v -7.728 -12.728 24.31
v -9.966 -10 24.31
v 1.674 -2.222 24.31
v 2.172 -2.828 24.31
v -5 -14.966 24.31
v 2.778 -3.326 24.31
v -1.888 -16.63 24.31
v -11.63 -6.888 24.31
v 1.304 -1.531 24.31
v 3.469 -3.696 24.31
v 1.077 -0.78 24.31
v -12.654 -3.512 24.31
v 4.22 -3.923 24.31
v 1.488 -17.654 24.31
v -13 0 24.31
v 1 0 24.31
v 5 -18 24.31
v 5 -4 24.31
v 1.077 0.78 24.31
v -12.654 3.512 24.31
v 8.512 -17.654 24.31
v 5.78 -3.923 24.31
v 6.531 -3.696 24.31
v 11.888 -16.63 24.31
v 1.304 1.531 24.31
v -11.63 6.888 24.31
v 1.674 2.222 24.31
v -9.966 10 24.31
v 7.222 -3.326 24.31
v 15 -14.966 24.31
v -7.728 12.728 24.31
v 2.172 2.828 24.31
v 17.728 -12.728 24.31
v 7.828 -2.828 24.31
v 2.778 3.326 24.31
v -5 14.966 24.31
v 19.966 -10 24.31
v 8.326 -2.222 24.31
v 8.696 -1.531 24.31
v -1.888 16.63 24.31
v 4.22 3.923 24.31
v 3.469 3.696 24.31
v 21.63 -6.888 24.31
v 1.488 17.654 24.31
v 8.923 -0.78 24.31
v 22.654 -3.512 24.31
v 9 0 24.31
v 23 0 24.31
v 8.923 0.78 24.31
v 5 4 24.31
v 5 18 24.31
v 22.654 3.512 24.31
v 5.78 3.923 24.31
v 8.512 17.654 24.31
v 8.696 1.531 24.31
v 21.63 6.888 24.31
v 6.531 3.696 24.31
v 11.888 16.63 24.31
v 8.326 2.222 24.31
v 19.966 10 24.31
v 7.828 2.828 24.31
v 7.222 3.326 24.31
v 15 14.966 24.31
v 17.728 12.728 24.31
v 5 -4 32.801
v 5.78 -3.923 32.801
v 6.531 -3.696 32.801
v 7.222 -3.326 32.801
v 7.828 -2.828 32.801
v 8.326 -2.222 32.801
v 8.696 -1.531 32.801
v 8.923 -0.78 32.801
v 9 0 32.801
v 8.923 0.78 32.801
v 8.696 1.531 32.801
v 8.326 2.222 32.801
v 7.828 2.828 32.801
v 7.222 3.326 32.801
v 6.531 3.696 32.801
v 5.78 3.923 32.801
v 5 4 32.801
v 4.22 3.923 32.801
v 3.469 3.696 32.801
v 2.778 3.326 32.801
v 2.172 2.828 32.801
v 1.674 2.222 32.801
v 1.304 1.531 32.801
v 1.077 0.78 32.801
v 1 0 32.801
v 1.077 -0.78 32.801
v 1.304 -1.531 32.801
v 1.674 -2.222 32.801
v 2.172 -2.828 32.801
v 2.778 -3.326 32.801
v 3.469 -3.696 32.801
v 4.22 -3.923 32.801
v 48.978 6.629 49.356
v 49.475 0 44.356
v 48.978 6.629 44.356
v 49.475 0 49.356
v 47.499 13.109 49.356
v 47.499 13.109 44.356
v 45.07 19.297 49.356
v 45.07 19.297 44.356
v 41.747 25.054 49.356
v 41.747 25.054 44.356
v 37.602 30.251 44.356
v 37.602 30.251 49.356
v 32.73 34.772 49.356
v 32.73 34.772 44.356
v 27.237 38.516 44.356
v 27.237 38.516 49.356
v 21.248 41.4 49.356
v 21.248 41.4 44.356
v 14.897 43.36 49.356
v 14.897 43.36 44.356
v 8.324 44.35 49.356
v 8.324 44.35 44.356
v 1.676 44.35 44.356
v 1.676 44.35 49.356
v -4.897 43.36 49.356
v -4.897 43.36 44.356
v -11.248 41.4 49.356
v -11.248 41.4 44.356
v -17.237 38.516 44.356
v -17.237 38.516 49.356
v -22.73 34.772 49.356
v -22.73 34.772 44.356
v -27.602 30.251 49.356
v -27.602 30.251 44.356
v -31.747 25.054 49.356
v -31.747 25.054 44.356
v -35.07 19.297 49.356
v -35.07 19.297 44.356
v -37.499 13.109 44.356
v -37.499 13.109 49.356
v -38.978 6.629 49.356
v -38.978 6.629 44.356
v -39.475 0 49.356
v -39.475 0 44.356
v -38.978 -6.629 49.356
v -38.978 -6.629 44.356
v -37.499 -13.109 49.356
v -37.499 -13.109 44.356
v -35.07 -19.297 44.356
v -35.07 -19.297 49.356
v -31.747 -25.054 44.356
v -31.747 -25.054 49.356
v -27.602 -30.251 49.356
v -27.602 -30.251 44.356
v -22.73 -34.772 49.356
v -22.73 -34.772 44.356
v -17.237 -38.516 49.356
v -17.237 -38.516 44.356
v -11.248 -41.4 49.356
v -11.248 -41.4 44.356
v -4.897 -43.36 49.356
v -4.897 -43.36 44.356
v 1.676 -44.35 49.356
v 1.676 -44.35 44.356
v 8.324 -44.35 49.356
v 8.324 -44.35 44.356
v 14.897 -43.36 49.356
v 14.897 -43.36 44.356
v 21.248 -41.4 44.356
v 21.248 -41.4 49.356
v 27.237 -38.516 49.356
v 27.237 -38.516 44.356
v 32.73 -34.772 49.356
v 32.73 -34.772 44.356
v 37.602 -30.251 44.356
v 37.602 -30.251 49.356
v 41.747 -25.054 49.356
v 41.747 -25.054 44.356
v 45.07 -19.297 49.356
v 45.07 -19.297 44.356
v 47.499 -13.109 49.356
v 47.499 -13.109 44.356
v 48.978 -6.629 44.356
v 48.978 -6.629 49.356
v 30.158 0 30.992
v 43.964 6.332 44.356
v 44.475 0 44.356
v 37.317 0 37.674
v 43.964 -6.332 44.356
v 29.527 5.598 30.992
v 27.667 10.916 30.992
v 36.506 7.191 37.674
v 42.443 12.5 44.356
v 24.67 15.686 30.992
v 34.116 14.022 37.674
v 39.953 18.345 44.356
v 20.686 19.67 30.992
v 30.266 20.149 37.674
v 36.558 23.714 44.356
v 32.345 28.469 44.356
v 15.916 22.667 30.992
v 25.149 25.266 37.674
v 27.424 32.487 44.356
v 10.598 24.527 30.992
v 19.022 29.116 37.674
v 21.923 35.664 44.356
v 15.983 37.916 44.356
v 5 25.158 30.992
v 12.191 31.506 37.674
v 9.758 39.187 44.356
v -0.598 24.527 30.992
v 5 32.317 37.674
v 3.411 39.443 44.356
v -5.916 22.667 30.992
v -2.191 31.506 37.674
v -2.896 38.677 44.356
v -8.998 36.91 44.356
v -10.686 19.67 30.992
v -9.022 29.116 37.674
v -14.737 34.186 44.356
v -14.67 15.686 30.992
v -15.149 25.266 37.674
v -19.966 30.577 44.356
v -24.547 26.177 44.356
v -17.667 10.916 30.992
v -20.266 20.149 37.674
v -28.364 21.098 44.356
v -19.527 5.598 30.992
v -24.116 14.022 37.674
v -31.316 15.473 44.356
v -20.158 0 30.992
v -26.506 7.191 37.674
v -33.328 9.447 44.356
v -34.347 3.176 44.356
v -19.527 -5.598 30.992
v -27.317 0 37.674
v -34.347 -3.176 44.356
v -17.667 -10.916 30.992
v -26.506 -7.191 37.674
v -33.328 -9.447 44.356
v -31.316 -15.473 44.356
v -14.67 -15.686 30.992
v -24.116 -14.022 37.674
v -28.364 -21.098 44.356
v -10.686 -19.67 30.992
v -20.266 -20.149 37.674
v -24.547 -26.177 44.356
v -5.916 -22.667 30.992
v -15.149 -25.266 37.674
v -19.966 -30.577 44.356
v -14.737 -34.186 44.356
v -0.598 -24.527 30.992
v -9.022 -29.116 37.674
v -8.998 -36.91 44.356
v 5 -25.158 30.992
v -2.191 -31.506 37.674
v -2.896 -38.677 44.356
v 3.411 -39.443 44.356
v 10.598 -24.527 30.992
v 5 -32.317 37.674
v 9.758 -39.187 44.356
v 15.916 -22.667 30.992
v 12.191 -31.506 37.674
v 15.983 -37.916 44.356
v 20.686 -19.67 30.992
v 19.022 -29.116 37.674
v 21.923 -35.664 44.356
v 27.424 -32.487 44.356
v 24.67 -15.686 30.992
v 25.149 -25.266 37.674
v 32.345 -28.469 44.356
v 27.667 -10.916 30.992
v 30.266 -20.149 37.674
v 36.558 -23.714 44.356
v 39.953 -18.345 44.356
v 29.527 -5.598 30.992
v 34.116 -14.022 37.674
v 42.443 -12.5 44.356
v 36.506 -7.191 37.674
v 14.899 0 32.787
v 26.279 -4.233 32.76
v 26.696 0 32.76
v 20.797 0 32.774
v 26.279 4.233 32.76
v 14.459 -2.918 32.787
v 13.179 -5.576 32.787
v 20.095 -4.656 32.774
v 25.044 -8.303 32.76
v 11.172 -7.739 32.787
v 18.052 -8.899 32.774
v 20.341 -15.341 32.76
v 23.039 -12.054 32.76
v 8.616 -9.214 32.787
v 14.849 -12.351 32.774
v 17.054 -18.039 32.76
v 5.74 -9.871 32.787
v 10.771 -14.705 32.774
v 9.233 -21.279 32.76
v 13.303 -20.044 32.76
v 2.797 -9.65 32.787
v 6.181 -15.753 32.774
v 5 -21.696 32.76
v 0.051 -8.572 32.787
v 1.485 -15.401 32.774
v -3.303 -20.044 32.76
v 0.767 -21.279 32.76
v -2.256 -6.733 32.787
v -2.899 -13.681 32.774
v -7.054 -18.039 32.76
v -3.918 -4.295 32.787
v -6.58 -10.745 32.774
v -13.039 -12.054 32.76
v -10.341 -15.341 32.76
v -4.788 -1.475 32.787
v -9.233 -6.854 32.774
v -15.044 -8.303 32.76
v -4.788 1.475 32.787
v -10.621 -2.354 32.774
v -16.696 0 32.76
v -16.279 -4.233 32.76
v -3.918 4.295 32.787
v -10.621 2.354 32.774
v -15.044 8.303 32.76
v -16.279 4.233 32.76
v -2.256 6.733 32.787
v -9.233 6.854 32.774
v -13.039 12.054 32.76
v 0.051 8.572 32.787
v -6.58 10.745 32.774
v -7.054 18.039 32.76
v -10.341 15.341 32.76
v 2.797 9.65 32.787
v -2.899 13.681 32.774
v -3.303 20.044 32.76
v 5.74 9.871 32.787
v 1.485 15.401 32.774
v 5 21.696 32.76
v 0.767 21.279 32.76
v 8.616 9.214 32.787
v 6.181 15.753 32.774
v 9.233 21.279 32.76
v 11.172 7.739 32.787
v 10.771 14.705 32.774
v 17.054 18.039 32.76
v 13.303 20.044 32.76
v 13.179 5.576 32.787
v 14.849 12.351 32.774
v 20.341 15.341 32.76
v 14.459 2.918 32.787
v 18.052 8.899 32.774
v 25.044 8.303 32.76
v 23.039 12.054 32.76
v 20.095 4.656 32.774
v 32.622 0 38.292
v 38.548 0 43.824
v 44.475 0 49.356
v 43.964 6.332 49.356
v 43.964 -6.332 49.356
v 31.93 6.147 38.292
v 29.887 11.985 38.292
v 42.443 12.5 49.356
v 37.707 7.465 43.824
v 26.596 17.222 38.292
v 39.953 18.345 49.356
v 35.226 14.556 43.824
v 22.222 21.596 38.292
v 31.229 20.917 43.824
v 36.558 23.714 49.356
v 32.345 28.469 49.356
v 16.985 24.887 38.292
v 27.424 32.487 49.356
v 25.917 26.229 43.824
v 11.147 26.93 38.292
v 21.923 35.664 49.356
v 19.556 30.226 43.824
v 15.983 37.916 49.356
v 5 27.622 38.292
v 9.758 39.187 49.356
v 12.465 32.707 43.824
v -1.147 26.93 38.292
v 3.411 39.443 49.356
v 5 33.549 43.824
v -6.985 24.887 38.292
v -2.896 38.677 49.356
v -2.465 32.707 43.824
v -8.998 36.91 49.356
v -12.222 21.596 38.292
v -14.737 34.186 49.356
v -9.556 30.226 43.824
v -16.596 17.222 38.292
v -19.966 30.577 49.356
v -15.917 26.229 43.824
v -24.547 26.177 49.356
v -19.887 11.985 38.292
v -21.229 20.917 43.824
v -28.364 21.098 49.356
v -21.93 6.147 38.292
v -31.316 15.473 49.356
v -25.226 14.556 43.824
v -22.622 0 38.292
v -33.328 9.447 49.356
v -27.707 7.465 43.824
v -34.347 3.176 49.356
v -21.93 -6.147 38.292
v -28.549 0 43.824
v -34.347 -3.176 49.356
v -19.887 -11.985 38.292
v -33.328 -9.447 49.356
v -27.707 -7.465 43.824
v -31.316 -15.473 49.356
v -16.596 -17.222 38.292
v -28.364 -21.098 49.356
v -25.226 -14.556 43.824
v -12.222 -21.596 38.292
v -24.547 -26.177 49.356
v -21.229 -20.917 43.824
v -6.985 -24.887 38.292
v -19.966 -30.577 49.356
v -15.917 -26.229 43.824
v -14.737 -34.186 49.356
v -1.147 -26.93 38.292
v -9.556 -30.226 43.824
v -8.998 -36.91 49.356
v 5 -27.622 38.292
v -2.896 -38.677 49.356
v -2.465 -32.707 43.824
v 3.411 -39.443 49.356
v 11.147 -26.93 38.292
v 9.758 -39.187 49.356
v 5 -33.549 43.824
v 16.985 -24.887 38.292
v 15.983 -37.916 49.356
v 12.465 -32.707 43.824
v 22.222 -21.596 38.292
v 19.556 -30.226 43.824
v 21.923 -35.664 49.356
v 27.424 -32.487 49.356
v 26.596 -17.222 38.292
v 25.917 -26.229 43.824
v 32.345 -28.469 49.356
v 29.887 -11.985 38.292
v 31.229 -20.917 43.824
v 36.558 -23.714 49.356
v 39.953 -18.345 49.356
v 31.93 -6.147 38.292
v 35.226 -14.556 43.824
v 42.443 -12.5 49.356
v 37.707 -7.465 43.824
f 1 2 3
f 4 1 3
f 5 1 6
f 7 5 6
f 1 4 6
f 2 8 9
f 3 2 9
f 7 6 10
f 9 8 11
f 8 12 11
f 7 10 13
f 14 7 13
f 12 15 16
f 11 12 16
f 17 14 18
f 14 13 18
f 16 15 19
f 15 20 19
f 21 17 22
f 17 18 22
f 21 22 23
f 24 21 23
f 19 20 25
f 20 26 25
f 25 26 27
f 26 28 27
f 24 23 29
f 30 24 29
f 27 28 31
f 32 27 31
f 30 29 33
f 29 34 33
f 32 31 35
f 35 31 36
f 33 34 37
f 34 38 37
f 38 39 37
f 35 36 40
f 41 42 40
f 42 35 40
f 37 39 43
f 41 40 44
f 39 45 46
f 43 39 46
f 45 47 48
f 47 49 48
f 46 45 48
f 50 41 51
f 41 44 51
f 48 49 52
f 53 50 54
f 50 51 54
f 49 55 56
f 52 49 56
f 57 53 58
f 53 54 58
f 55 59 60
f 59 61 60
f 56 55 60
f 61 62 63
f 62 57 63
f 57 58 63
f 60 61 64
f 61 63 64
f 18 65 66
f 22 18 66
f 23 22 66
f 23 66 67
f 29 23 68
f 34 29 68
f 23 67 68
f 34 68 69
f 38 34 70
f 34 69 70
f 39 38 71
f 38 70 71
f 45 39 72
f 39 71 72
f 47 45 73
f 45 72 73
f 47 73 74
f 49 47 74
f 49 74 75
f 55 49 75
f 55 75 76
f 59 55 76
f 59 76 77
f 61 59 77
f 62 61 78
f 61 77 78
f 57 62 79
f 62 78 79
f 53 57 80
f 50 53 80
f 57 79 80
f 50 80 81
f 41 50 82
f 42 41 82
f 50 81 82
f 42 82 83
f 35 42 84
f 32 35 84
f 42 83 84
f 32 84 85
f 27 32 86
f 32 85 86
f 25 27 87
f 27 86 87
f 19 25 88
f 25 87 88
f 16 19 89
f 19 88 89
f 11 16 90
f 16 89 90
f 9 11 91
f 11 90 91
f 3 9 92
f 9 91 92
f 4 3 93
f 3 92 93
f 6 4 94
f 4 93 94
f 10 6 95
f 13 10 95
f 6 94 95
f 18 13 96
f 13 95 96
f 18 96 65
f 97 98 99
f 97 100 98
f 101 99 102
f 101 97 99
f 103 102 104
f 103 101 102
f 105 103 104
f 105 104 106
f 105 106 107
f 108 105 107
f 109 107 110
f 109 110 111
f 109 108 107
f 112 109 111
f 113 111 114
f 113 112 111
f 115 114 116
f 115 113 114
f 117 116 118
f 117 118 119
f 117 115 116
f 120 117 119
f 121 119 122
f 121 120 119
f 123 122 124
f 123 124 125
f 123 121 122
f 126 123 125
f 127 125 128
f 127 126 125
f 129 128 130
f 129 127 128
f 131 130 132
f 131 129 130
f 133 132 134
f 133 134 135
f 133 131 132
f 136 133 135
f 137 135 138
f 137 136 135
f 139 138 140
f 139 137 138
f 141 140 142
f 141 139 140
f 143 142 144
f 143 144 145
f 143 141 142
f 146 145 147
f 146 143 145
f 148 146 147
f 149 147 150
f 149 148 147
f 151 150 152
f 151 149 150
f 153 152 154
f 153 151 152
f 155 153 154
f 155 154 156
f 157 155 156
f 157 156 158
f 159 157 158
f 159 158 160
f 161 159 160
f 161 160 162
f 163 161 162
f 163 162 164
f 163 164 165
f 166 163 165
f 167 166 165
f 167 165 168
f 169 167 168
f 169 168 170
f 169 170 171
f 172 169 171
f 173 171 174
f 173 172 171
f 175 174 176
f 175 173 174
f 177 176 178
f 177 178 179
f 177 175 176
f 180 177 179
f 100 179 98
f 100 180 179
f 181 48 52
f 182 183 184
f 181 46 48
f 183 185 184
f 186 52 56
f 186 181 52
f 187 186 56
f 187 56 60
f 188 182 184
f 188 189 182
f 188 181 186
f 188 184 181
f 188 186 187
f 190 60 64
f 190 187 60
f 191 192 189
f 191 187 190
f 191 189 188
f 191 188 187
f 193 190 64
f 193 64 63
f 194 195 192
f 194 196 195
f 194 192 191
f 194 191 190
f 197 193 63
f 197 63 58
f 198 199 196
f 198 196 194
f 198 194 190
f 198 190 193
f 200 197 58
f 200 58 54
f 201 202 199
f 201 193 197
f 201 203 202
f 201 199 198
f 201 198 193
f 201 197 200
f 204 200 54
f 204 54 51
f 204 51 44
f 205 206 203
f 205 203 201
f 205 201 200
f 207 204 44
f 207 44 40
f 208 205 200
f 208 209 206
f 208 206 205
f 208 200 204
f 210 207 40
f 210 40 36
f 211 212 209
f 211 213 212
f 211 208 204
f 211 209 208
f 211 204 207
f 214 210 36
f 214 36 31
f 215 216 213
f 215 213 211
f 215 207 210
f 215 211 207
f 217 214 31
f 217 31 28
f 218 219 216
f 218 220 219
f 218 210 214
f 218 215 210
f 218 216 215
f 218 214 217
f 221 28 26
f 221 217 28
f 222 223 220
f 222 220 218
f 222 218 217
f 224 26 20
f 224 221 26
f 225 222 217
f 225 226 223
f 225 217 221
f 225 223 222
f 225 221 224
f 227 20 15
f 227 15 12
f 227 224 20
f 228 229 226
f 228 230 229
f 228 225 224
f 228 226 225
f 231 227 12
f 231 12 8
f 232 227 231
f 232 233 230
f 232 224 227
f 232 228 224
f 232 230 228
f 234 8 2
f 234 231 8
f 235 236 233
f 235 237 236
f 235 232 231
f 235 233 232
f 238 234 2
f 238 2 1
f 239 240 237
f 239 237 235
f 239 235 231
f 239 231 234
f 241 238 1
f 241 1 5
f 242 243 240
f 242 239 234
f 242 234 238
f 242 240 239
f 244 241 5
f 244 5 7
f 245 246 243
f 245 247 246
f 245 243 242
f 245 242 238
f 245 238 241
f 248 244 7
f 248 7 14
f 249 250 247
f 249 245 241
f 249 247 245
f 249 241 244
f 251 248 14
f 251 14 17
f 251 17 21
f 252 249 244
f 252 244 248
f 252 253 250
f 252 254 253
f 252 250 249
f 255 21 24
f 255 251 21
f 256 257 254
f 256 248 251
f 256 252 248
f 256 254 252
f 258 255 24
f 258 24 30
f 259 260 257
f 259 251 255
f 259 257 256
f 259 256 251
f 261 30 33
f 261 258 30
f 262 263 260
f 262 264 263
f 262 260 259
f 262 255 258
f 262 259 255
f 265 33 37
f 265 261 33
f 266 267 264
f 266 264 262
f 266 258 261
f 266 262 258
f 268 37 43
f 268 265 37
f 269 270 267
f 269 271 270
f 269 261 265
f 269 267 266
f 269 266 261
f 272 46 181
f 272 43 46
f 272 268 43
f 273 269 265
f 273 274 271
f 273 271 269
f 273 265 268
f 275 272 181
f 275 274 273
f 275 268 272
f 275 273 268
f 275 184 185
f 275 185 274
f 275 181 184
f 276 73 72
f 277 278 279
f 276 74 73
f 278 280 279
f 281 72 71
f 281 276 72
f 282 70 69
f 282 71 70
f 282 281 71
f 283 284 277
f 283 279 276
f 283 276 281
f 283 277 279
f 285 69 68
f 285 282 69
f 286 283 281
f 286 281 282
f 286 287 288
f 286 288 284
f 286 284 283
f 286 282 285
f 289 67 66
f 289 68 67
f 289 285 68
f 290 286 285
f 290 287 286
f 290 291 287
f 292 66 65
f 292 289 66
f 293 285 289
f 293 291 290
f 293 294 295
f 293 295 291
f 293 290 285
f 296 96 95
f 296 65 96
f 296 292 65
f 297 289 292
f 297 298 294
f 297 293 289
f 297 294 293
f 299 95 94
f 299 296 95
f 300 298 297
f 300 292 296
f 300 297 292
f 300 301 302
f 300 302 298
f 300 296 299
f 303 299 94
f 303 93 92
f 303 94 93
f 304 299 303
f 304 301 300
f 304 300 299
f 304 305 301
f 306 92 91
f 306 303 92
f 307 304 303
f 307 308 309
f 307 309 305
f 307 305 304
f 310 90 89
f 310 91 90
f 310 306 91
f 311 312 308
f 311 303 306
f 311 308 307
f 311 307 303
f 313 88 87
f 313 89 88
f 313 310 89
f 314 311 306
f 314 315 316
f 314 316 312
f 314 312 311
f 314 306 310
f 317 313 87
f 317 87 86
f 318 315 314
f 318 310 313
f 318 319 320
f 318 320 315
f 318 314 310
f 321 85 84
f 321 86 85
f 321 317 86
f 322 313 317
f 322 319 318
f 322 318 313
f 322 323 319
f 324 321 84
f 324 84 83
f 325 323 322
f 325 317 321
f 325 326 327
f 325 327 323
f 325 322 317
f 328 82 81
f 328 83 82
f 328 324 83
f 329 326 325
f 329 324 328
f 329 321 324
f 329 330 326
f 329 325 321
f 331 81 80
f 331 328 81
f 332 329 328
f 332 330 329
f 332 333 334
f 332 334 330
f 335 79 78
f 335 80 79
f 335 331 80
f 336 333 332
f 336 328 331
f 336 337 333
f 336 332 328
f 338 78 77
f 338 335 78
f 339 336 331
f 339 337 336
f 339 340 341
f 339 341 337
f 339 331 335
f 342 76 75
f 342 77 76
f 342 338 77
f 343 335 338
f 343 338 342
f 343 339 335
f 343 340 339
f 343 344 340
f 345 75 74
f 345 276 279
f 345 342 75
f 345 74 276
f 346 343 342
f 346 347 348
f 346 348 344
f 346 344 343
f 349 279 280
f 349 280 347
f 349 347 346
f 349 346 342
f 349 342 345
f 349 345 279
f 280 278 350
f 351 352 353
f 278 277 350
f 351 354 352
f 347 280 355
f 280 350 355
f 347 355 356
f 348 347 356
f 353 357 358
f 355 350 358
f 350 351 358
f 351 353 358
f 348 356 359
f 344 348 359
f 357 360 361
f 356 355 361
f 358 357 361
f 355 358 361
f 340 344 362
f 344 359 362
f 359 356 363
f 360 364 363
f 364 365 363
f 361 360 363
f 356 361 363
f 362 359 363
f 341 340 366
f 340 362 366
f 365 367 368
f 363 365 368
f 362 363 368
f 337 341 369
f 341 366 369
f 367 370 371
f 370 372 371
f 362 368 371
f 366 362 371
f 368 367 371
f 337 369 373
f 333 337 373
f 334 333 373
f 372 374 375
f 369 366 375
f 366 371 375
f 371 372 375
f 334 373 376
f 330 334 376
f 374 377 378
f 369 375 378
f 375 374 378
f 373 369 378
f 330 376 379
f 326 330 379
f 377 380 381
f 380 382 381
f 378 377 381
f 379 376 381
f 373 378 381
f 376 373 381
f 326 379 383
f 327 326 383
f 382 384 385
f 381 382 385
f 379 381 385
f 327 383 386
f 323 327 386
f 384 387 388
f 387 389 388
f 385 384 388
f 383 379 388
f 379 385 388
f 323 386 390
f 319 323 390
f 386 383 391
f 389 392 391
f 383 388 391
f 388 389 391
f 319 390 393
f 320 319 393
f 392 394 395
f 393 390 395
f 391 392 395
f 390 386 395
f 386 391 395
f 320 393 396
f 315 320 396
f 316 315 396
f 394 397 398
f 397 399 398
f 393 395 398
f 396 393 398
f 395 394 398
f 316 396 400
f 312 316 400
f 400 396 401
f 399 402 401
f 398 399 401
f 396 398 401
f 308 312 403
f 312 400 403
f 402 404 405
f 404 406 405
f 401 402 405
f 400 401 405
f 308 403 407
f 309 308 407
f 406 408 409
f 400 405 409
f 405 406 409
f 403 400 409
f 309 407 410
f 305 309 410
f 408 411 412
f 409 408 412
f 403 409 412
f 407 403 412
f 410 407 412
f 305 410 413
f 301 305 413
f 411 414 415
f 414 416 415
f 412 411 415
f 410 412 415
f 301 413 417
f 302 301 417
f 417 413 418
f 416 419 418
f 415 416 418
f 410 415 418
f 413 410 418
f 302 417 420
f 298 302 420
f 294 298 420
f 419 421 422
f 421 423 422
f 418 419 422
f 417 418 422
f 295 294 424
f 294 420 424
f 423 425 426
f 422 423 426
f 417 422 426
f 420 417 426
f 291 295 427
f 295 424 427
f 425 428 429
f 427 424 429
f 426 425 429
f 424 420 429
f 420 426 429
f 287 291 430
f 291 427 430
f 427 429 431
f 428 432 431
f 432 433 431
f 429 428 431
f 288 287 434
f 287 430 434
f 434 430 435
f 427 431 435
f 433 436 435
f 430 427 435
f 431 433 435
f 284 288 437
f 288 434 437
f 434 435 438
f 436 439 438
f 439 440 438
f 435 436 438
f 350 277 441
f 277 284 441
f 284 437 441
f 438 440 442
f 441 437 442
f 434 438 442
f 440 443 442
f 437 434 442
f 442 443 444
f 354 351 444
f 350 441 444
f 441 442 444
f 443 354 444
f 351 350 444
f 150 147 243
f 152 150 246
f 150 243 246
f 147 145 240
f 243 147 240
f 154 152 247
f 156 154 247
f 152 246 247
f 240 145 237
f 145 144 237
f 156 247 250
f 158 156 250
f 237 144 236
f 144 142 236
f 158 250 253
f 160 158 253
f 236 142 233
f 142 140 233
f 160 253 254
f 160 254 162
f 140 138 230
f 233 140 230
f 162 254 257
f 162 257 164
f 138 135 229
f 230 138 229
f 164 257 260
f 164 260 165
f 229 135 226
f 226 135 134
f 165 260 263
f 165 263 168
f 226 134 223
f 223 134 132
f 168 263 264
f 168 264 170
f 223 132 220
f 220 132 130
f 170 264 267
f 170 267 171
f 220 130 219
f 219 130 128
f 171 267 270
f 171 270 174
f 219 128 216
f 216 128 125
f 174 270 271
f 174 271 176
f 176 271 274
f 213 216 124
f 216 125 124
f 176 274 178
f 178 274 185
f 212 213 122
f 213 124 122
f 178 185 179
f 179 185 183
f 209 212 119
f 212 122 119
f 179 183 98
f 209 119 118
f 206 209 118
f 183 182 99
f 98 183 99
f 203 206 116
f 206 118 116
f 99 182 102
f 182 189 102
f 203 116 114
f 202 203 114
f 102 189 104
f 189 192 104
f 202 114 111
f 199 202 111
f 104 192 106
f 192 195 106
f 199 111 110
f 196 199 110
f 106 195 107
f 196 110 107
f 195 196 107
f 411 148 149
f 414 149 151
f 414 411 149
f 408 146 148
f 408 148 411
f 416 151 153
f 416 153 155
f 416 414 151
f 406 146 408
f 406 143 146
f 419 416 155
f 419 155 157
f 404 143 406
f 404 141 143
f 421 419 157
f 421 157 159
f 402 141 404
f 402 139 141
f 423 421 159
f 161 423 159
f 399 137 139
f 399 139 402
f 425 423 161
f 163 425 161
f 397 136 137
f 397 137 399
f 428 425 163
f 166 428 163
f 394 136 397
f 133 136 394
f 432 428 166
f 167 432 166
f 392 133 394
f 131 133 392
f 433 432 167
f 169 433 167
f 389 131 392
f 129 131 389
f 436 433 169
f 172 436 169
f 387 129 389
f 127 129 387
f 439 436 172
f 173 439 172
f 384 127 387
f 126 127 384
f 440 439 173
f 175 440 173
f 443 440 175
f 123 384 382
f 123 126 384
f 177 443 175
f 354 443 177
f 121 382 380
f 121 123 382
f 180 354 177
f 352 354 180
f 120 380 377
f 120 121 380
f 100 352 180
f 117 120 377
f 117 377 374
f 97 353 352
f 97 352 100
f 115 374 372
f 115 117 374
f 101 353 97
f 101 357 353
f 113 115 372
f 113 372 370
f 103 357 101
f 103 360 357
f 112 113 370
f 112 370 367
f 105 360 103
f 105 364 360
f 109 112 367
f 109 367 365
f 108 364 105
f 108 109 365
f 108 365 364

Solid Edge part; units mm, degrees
sketch "Sketch1" plane through (0, 0, 0) normal (0, -1, 0) x (1, 0, 0)
  line L0 (5, 24.31) -> (5, 32.81)
  line L1 (5, 32.81) -> (26.6959, 32.76)
  line L2 (44.4748, 49.3562) -> (26.6959, 32.76)
  line L3 (49.4748, 49.3562) -> (44.4748, 49.3562)
  line L4 (49.4748, 44.3562) -> (49.4748, 49.3562)
  line L5 (44.4748, 44.3562) -> (49.4748, 44.3562)
  line L6 (23, 24.31) -> (44.4748, 44.3562)
  line L7 (5, 24.31) -> (23, 24.31)
revolve "RevolvedProtrusion1" add sketch "Sketch1" angle 360 about axis through (5, 0, 15.0377) along (0, 0, 1)
hole "Hole1" at (5, 0, 32.81) direction (0, 0, -1) diameter 8 end through all
